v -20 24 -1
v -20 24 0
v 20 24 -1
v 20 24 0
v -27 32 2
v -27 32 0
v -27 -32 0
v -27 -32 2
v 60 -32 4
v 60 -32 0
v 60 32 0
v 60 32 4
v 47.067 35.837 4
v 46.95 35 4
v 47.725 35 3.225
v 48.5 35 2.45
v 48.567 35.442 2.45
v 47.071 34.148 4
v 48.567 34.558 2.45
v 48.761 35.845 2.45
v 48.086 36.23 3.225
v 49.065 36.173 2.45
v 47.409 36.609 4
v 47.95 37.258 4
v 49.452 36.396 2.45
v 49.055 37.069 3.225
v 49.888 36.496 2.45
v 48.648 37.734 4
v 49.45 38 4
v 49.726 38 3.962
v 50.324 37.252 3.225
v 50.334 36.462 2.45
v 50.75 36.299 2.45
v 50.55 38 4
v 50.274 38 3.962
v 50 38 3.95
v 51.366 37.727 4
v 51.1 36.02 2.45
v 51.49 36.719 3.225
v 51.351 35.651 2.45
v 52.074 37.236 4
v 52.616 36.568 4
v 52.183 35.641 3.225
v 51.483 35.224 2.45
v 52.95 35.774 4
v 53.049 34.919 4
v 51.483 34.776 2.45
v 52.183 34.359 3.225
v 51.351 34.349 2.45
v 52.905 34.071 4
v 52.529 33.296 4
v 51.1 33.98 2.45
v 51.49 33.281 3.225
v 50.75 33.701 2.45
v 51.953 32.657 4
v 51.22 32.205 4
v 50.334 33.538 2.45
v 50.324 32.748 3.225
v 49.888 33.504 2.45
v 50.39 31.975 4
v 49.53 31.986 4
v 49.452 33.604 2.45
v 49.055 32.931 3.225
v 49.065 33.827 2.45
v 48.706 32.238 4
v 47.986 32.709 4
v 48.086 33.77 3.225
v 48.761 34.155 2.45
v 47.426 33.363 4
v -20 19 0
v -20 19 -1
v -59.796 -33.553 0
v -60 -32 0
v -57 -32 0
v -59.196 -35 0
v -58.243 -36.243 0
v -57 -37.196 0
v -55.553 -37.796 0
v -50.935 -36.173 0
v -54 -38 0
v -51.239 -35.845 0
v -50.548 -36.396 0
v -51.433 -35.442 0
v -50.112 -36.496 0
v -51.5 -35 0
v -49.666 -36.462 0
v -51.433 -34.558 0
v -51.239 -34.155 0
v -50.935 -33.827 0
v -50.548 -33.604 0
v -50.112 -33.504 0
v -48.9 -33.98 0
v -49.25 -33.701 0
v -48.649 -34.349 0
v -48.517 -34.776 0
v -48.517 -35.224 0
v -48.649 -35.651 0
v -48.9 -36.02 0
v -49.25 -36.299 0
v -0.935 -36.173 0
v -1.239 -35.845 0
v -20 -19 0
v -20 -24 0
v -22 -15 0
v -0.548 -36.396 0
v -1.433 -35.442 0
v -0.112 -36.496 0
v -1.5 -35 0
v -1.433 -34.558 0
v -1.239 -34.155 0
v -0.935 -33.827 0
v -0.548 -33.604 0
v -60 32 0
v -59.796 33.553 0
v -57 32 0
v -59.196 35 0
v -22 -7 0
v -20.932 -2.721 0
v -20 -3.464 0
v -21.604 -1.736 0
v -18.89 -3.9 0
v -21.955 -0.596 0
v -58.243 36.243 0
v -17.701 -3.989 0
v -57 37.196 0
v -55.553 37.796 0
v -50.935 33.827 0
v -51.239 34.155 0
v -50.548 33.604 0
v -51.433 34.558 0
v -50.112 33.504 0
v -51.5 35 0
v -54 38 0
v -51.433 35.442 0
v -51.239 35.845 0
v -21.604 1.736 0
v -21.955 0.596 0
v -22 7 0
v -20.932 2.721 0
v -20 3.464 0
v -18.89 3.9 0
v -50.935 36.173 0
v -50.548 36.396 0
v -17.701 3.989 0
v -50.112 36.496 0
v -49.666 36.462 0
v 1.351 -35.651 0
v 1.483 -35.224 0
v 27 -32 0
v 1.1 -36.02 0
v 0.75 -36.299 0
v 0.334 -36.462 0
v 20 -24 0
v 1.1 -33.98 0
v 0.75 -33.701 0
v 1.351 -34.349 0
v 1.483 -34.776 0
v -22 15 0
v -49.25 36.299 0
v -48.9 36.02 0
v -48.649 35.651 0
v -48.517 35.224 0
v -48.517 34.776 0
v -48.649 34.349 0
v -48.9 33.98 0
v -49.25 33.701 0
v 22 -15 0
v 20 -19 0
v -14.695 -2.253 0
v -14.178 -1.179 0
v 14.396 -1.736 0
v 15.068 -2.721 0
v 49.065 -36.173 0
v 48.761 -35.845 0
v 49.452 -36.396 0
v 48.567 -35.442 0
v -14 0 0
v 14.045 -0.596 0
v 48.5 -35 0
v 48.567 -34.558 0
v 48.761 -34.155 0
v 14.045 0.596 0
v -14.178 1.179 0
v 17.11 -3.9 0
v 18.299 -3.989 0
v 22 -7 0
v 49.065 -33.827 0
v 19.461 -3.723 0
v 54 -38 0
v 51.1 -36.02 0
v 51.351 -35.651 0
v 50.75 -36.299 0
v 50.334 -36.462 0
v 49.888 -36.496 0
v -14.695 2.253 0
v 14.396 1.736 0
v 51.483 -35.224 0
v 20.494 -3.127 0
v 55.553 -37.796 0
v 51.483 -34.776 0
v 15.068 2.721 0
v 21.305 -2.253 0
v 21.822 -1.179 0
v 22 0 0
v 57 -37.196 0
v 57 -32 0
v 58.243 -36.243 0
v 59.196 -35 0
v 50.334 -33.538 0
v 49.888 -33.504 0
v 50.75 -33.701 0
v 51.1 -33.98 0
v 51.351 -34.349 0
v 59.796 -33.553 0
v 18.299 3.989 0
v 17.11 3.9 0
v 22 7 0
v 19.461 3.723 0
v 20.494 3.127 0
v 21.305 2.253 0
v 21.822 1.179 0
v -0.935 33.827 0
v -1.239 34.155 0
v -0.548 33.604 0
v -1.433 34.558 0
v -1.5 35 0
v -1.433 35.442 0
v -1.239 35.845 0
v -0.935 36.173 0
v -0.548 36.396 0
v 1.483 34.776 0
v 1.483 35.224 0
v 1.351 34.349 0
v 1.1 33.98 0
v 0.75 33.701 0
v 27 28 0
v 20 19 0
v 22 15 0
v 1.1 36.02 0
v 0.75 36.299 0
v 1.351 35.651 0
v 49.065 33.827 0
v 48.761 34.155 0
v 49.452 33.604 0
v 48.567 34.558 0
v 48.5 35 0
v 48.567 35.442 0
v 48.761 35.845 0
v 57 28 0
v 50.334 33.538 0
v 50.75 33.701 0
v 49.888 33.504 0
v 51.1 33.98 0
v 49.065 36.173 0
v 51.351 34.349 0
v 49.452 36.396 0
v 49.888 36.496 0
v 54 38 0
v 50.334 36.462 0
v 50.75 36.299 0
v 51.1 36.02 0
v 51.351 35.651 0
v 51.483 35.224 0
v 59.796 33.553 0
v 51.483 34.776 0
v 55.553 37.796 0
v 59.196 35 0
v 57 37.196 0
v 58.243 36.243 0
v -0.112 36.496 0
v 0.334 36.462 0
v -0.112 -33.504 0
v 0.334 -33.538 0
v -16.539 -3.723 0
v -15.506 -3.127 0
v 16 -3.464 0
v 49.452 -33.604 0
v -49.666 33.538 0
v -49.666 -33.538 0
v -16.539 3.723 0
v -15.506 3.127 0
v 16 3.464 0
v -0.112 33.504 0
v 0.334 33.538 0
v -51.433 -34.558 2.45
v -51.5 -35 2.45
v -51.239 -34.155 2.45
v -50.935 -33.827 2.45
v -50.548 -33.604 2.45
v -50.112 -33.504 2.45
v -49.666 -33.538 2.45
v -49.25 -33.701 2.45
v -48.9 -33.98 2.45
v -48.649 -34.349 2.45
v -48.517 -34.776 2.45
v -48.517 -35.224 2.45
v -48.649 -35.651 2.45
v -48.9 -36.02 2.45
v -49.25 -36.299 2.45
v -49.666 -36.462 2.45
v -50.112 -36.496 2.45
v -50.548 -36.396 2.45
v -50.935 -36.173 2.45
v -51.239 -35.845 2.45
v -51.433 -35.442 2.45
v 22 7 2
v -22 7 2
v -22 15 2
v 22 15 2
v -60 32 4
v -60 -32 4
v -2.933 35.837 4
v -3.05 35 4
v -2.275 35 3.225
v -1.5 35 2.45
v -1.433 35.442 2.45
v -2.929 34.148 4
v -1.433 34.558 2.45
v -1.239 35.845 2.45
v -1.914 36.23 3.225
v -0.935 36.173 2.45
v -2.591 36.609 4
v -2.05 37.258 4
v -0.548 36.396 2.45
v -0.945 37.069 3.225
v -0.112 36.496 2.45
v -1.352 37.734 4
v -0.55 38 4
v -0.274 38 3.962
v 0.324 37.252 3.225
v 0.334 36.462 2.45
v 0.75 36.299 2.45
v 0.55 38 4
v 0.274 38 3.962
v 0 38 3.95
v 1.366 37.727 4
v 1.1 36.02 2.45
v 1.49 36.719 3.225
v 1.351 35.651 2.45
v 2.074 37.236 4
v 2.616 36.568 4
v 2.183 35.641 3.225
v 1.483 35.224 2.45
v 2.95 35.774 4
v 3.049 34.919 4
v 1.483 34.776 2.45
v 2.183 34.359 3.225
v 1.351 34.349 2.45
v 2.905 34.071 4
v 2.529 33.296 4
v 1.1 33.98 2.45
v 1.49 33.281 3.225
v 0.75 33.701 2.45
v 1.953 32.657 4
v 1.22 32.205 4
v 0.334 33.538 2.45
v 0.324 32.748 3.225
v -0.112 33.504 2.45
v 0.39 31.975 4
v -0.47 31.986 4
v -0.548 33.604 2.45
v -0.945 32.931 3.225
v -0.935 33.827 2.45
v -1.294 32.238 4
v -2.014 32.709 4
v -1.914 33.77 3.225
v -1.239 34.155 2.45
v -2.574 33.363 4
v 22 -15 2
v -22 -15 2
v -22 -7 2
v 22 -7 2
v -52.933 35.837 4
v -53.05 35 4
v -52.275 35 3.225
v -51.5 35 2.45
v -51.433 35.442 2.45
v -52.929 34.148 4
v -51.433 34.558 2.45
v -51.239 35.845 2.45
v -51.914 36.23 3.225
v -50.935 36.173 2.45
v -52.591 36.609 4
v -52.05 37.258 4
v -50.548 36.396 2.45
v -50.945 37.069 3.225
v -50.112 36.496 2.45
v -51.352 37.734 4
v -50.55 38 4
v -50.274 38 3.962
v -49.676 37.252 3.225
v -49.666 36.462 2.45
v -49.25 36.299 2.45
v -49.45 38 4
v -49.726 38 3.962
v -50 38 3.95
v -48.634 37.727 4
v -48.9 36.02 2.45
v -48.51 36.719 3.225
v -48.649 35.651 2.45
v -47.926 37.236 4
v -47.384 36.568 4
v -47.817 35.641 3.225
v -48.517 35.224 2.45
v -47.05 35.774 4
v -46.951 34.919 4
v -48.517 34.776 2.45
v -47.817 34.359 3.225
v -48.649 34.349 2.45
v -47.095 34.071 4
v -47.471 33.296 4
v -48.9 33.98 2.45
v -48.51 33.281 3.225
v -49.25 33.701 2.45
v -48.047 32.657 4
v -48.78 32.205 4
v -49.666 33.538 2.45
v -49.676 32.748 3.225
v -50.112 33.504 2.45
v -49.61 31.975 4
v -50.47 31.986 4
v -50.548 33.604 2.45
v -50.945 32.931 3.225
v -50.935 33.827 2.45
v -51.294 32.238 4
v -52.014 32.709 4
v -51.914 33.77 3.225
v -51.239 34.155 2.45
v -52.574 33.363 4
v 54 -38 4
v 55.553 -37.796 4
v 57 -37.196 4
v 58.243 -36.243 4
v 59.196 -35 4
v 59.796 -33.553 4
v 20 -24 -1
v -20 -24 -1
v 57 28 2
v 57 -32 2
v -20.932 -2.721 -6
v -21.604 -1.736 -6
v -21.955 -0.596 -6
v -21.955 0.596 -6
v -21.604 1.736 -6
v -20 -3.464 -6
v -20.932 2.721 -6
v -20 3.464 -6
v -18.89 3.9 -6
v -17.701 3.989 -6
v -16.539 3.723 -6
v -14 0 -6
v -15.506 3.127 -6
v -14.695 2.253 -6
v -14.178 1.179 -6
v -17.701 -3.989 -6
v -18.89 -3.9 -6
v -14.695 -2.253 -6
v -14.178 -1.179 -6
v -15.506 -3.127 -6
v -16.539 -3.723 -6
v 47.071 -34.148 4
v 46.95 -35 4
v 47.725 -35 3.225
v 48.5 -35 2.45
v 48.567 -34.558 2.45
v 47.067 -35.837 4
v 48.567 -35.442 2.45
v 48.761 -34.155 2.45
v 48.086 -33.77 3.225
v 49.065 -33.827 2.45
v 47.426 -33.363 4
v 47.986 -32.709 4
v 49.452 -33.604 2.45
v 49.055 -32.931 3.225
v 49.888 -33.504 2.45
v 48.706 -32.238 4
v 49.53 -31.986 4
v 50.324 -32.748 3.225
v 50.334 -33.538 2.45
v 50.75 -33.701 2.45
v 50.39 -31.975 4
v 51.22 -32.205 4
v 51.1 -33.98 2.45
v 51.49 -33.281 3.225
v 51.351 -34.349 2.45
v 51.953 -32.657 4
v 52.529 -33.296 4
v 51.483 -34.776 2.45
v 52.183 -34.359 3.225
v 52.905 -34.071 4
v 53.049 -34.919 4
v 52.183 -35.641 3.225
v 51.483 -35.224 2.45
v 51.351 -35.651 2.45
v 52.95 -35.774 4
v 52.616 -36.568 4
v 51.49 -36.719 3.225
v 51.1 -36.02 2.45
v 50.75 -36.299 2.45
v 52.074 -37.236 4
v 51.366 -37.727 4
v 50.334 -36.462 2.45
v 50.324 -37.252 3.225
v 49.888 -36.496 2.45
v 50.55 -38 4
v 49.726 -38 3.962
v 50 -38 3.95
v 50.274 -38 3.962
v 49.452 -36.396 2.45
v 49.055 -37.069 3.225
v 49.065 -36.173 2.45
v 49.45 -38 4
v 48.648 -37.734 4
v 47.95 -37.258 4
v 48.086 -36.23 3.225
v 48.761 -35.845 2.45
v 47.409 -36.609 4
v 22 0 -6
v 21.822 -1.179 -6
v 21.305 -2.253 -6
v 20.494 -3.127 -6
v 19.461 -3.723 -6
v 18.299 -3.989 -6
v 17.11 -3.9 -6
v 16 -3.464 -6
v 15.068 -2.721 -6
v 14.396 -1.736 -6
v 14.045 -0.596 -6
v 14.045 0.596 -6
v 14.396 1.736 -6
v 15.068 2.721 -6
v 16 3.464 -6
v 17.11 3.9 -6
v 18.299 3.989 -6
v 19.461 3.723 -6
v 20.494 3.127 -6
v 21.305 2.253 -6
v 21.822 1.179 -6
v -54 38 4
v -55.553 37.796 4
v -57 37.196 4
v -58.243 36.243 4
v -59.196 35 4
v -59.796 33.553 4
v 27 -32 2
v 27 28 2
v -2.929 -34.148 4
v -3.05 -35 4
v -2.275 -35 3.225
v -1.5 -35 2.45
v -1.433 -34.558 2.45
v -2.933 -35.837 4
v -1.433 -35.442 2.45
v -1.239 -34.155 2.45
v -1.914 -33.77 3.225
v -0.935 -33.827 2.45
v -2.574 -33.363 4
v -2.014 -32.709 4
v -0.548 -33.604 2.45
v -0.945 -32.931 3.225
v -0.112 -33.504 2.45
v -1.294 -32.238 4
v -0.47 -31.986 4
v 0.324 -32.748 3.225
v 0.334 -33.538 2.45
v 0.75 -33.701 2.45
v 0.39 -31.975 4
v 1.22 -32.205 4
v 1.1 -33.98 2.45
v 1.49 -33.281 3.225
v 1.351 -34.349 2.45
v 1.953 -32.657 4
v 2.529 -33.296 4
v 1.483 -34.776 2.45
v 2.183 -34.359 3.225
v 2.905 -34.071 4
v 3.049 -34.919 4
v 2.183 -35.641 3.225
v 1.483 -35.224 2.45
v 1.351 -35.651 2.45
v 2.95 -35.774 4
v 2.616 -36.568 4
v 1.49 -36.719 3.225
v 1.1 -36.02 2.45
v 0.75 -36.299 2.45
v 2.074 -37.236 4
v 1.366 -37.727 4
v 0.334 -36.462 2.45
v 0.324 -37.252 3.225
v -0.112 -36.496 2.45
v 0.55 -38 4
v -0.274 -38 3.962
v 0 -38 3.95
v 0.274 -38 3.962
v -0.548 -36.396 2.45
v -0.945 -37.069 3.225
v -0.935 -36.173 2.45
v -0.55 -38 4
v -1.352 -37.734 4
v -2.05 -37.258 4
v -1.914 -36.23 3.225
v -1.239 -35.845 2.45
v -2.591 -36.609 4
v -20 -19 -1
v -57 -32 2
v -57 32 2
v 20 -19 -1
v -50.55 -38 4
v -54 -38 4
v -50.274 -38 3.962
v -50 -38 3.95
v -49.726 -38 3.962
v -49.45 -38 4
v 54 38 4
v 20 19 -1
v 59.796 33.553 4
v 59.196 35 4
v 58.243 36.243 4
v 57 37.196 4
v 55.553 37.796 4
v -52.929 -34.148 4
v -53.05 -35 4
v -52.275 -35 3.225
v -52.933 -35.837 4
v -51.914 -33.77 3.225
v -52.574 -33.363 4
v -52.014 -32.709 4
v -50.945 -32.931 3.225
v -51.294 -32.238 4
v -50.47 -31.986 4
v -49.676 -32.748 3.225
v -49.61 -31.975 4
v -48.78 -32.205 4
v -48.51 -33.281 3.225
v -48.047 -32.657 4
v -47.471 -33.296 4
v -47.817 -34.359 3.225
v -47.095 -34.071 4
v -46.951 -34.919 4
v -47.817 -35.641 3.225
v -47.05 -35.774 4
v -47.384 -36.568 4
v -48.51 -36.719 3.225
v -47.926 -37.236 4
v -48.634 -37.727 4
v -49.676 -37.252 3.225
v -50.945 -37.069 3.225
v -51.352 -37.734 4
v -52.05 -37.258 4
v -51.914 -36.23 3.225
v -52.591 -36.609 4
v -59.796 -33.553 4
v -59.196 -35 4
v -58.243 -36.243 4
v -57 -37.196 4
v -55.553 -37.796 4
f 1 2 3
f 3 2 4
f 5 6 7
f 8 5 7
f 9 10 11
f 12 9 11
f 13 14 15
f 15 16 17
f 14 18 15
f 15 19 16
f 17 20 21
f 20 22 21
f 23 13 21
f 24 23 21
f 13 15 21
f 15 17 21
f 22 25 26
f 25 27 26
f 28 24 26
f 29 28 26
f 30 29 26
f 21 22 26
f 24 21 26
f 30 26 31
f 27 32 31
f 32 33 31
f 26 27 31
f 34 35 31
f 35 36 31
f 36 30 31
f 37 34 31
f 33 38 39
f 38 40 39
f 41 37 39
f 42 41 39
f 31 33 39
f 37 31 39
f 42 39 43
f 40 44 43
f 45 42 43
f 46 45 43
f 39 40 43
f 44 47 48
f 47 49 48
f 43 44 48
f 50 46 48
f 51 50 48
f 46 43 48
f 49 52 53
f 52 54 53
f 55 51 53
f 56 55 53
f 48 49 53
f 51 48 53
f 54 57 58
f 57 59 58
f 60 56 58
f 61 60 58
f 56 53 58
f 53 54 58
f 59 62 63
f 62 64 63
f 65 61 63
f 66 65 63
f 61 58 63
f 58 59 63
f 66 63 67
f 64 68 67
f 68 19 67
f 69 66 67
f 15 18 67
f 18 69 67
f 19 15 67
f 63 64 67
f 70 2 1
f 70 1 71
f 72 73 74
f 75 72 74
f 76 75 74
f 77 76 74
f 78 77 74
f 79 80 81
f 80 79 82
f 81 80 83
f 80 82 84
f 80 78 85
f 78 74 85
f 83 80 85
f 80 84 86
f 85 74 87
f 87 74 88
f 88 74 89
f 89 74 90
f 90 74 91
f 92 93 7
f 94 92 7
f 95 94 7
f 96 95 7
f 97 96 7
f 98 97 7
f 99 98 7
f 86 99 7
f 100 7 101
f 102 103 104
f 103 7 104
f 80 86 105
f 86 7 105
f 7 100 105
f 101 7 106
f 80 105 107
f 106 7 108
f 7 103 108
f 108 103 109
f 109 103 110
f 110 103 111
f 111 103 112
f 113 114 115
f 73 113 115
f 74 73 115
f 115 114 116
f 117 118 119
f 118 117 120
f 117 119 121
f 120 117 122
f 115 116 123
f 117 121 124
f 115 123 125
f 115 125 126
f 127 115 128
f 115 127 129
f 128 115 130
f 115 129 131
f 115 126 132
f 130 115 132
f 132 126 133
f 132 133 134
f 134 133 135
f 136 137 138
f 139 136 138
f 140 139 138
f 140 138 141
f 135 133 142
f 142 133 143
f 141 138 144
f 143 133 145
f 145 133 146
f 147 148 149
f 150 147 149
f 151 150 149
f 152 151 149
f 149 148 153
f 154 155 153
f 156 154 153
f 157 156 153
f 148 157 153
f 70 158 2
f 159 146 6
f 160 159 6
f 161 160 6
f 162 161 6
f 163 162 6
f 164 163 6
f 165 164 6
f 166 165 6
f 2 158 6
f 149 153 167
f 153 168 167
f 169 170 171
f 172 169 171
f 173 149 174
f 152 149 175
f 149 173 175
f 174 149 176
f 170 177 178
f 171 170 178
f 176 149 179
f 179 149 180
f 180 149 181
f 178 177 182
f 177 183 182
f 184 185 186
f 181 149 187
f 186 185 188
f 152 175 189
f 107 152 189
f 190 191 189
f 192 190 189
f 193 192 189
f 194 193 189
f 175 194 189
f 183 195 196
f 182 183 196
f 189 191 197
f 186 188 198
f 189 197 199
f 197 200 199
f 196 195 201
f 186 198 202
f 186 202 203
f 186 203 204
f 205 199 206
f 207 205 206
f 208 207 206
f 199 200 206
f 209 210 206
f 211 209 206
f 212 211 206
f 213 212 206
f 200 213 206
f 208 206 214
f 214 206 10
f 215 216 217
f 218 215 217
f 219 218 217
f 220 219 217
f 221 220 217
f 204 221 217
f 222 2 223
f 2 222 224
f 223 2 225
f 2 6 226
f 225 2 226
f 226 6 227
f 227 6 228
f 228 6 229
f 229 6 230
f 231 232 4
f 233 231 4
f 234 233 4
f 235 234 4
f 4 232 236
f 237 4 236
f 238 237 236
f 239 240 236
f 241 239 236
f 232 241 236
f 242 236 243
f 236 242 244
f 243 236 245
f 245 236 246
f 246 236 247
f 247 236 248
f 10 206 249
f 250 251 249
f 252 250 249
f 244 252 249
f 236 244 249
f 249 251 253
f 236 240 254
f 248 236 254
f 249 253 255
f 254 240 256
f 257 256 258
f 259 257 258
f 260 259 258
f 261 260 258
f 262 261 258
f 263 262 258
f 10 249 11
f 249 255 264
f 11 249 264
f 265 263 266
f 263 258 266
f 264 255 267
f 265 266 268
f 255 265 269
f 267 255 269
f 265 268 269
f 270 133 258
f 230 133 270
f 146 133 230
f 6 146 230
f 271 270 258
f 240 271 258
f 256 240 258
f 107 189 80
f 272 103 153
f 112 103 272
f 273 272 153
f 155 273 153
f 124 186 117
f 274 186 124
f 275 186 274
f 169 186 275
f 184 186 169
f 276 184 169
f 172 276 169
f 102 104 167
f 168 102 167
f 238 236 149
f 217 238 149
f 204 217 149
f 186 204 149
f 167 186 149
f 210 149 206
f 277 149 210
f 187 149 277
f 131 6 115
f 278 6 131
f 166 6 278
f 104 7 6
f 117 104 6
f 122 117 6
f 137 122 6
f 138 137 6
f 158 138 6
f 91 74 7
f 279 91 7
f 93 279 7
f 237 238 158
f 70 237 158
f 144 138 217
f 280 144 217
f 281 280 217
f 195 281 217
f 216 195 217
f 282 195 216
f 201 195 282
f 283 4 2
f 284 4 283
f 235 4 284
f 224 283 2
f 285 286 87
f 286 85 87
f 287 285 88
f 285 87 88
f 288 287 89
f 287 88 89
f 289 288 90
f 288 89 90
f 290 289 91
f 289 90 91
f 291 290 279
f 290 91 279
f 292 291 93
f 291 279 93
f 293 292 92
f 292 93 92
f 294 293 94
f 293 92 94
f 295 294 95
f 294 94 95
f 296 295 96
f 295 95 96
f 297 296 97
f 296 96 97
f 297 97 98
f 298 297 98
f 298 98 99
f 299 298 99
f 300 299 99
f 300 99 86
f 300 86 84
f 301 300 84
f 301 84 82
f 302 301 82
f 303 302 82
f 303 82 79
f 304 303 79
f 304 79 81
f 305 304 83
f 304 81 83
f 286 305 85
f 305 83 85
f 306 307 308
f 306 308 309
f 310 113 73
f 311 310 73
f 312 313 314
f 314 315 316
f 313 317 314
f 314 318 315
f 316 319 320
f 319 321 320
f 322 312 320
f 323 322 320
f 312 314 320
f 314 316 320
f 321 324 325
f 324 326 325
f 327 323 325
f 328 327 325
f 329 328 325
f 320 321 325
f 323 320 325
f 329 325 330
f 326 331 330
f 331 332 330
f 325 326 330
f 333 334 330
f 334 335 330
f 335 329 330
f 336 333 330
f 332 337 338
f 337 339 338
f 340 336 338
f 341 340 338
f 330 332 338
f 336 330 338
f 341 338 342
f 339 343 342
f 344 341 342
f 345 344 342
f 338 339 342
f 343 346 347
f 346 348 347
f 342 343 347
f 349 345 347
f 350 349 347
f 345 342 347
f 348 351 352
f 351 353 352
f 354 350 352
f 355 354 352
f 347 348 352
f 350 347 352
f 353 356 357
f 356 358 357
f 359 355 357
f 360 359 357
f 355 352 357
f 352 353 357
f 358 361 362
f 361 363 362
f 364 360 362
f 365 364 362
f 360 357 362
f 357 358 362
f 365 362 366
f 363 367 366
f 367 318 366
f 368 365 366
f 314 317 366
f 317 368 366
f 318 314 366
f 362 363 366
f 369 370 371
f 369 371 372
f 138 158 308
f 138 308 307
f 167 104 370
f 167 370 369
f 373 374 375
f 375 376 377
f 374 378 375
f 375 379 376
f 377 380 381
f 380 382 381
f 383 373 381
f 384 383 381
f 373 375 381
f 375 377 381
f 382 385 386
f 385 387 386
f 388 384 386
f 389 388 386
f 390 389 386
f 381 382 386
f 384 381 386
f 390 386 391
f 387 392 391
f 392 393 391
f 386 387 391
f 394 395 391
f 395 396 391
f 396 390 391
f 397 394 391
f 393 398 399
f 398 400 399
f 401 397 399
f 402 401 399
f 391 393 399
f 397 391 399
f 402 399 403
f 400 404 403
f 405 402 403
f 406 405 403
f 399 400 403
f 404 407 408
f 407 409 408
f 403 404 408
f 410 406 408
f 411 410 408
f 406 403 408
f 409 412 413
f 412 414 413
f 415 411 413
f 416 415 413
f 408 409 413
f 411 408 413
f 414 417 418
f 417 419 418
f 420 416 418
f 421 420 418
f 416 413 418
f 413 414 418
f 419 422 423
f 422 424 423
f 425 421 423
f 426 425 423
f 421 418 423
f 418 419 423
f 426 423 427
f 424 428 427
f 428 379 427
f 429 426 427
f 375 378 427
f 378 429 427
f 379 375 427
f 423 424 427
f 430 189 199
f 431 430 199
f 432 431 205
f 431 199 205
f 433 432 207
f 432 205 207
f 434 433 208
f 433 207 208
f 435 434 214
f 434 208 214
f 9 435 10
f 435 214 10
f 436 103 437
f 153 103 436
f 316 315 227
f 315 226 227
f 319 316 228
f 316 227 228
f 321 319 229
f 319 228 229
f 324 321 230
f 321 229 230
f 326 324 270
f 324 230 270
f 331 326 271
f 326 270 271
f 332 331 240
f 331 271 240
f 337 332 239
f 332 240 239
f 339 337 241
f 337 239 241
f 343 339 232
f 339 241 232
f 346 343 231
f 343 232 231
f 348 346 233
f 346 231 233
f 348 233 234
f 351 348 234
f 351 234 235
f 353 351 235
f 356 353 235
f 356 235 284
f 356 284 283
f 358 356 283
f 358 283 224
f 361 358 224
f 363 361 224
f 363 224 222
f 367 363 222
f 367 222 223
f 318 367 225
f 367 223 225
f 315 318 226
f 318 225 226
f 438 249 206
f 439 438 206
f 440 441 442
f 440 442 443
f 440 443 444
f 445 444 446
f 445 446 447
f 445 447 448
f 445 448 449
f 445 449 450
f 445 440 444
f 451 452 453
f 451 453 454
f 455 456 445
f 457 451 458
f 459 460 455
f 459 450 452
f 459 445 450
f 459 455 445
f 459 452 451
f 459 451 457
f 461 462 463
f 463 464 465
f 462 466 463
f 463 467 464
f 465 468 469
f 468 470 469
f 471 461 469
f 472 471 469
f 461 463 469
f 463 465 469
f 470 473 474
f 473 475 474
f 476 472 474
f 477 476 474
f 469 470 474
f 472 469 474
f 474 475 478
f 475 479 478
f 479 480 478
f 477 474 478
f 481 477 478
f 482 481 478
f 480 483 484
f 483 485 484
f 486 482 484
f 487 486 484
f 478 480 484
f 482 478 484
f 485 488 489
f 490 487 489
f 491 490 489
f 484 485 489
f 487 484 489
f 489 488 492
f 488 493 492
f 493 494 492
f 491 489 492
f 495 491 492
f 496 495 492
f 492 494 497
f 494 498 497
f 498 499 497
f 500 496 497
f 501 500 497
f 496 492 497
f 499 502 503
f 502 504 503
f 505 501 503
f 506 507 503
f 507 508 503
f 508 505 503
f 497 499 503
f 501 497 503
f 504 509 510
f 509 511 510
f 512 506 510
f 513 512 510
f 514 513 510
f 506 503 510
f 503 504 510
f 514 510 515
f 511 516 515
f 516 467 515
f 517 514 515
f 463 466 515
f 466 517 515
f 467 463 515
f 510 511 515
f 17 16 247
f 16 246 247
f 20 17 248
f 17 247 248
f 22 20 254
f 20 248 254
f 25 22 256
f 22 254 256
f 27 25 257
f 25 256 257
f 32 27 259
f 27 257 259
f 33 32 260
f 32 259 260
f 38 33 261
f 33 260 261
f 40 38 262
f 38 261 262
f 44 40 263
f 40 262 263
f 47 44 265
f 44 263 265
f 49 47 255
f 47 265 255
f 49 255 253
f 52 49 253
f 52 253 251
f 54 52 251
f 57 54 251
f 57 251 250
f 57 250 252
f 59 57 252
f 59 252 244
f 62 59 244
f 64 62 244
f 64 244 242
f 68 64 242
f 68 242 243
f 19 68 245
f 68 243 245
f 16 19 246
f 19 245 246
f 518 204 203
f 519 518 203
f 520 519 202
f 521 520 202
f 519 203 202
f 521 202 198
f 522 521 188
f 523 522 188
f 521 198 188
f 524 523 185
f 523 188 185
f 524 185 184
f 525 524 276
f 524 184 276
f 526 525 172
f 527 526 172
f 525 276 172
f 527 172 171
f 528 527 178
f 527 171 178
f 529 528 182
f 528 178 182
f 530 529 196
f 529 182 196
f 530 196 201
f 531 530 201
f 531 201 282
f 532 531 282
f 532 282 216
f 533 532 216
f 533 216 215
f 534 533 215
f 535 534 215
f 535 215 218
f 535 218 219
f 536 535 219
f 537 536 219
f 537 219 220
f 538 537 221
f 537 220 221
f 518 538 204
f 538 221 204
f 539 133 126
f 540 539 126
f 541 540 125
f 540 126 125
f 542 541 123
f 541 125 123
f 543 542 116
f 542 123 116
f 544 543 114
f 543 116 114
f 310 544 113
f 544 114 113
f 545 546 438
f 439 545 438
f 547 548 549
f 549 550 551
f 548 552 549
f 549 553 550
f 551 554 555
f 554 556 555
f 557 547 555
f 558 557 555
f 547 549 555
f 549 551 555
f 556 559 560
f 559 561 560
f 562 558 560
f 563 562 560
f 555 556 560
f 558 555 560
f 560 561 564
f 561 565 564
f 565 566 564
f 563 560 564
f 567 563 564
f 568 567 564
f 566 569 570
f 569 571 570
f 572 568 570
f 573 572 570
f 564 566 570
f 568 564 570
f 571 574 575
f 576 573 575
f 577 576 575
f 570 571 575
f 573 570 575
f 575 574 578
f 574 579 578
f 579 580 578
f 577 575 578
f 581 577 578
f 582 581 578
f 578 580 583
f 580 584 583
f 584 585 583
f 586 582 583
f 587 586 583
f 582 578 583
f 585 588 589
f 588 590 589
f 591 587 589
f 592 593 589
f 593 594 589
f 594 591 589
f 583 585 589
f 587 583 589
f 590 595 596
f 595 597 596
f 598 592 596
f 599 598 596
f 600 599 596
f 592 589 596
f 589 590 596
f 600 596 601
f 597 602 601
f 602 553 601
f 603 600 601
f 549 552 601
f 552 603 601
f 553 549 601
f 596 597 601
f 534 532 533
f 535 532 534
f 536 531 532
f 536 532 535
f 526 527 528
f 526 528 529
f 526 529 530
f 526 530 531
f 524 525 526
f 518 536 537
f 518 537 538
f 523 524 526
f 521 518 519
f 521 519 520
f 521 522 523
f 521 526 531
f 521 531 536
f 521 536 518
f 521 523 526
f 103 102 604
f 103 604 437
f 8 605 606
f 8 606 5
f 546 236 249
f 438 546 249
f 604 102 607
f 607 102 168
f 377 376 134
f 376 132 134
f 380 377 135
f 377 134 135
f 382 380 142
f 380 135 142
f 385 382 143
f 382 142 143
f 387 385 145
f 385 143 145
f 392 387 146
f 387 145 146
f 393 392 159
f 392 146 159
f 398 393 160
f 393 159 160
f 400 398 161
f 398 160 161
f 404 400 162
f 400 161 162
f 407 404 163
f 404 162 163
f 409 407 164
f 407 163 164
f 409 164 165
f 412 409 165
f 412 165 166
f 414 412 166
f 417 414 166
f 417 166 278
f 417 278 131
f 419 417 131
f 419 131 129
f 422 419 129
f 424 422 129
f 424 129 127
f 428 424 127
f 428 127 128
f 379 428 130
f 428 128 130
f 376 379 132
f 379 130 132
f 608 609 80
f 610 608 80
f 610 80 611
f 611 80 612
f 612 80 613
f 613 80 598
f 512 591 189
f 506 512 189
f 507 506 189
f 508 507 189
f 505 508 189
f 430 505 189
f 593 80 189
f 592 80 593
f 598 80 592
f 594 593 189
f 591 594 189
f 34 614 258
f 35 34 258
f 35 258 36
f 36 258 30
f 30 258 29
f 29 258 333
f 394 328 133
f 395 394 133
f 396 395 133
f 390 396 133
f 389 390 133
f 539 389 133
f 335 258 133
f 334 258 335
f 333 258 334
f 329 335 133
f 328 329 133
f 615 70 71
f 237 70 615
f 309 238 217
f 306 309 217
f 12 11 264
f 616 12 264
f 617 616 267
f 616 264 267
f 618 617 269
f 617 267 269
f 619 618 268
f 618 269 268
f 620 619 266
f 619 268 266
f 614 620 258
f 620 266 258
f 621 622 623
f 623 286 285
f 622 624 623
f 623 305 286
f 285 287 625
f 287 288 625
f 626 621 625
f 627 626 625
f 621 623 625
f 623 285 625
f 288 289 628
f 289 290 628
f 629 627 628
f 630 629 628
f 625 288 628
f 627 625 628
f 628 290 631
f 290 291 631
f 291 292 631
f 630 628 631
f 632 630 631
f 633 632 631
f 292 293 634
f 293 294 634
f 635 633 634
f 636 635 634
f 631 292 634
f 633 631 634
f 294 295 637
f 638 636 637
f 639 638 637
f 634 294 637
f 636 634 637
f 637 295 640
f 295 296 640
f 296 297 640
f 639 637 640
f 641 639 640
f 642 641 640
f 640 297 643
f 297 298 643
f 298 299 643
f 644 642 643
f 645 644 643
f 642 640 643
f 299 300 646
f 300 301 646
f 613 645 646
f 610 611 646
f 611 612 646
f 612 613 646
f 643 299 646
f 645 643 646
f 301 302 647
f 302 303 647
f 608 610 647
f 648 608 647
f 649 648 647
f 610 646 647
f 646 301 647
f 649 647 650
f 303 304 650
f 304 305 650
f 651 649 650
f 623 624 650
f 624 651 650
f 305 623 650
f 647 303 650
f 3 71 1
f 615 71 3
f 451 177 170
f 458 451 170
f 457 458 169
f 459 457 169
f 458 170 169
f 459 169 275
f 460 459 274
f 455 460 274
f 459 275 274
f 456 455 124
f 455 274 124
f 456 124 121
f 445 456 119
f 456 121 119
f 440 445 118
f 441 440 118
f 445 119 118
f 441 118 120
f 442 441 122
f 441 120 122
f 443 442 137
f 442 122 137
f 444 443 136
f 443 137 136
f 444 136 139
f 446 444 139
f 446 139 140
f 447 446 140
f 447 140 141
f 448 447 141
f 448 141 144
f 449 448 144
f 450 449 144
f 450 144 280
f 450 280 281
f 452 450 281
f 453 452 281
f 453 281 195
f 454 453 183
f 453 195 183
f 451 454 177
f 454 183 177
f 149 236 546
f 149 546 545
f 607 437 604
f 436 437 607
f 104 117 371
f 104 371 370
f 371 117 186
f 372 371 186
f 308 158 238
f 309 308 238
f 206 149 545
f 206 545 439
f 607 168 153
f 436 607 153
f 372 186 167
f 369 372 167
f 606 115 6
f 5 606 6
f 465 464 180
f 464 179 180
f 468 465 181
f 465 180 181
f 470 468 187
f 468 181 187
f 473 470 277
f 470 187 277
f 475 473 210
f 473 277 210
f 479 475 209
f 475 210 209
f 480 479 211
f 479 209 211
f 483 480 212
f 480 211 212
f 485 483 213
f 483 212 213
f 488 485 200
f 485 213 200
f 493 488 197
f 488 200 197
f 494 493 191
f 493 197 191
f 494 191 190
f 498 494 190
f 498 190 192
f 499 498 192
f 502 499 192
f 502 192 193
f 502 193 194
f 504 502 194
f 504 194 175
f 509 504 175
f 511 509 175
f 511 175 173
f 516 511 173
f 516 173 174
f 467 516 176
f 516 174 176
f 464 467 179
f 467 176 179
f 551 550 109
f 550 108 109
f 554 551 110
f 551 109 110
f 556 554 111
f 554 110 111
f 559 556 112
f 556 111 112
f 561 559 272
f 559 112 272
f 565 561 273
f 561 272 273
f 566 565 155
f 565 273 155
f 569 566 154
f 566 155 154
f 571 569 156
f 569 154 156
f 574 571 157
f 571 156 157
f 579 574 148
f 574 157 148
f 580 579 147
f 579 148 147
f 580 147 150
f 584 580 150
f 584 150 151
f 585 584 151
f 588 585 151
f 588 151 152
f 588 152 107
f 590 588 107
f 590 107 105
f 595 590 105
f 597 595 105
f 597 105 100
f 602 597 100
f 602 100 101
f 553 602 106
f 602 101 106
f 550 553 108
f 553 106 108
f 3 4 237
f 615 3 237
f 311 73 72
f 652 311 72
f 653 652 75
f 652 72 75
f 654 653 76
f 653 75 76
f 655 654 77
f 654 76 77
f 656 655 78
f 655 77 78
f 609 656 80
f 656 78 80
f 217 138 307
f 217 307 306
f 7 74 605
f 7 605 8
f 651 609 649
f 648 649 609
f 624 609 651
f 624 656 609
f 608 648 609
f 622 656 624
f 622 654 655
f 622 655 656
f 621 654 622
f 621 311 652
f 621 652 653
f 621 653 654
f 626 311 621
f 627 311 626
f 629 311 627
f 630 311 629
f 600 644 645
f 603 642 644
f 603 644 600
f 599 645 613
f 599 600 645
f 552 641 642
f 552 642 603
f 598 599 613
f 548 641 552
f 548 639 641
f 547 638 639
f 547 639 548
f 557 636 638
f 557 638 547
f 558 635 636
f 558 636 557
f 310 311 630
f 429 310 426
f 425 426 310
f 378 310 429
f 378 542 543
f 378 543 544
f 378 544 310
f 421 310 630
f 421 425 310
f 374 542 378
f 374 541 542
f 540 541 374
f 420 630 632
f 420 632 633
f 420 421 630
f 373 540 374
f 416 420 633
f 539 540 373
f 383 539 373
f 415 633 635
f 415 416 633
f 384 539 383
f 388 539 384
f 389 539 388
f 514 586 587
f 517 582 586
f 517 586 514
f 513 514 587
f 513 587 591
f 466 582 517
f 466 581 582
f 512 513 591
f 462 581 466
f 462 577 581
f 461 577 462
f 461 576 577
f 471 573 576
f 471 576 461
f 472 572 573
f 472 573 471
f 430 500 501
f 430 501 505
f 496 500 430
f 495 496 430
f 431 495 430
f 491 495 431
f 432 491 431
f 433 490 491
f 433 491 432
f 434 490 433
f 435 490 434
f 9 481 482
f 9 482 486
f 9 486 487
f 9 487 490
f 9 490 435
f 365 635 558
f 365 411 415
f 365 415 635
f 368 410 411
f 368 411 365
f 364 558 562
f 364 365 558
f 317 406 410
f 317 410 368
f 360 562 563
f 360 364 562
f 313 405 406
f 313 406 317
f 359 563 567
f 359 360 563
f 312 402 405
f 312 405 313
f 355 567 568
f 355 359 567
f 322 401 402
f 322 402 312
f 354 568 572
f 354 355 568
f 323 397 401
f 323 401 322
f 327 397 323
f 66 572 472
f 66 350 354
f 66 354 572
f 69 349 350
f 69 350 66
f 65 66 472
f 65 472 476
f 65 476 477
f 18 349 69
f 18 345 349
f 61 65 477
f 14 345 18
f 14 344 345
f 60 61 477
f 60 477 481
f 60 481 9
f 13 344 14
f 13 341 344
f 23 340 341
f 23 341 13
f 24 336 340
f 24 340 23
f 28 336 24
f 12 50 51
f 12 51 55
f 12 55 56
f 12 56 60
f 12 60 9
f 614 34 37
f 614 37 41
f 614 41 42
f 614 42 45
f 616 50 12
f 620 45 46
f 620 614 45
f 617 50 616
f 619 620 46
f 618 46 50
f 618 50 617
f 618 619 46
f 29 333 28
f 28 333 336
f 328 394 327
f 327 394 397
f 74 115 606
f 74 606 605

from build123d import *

# Parameters (mm, degrees)
PAD_DEPTH        = 4
HOLE_D           = 3
HOLE_DEPTH       = 25
HOLE_CSINK_D     = 6.1
HOLE_CSINK_ANGLE = 90
SKETCH002_R      = 4
PAD001_DEPTH     = 6
SKETCH003_W      = 40
SKETCH003_H      = 5
PAD002_DEPTH     = 1
SKETCH004_W      = 30
SKETCH004_H      = 64
SKETCH004_H_2    = 60
SKETCH004_W_2    = 44
SKETCH004_H_3    = 8
POCKET_DEPTH     = 2


with BuildPart() as part:
    # Sketch → Pad (new body)
    with BuildSketch(Plane.XY):
        with BuildLine():
            Line((60, -32), (60, 32))
            ThreePointArc((60, 32), (58.242641, 36.242641), (54, 38))
            Line((54, 38), (-54, 38))
            ThreePointArc((-54, 38), (-58.242641, 36.242641), (-60, 32))
            Line((-60, 32), (-60, -32))
            ThreePointArc((-60, -32), (-58.242641, -36.242641), (-54, -38))
            Line((-54, -38), (54, -38))
            ThreePointArc((54, -38), (58.242641, -36.242641), (60, -32))
        make_face()
    extrude(amount=PAD_DEPTH)

    # Hole
    with Locations(Plane.XY.offset(4)):
        with Locations((0, -35), (0, 35), (50, 35), (-50, 35), (-50, -35), (50, -35)):
            CounterSinkHole(HOLE_D / 2, HOLE_CSINK_D / 2, depth=HOLE_DEPTH, counter_sink_angle=HOLE_CSINK_ANGLE)

    # Sketch002 (on Face4 of Hole) → Pad001 (join)
    with BuildSketch(Plane(origin=(0, 0, 0), x_dir=(1, 0, 0), z_dir=(0, 0, -1))):
        with Locations((18, 0)):
            Circle(SKETCH002_R)
        with Locations((-18, 0)):
            Circle(SKETCH002_R)
    extrude(amount=PAD001_DEPTH)

    # Sketch003 (on Face4 of Pad001) → Pad002 (join)
    with BuildSketch(Plane(origin=(0, 0, 0), x_dir=(1, 0, 0), z_dir=(0, 0, -1))):
        with Locations((0, 21.5)):
            Rectangle(SKETCH003_W, SKETCH003_H)
        with Locations((0, -21.5)):
            Rectangle(SKETCH003_W, SKETCH003_H)
    extrude(amount=PAD002_DEPTH)

    # Sketch004 (on Face4 of Pad002) → Pocket (cut)
    with BuildSketch(Plane(origin=(0, 0, 0), x_dir=(1, 0, 0), z_dir=(0, 0, -1))):
        with Locations((-42, 0)):
            Rectangle(SKETCH004_W, SKETCH004_H)
        with Locations((42, 2)):
            Rectangle(SKETCH004_W, SKETCH004_H_2)
        with Locations((0, 11)):
            Rectangle(SKETCH004_W_2, SKETCH004_H_3)
        with Locations((0, -11)):
            Rectangle(SKETCH004_W_2, SKETCH004_H_3)
    extrude(amount=-POCKET_DEPTH, mode=Mode.SUBTRACT)


solid = part.part
